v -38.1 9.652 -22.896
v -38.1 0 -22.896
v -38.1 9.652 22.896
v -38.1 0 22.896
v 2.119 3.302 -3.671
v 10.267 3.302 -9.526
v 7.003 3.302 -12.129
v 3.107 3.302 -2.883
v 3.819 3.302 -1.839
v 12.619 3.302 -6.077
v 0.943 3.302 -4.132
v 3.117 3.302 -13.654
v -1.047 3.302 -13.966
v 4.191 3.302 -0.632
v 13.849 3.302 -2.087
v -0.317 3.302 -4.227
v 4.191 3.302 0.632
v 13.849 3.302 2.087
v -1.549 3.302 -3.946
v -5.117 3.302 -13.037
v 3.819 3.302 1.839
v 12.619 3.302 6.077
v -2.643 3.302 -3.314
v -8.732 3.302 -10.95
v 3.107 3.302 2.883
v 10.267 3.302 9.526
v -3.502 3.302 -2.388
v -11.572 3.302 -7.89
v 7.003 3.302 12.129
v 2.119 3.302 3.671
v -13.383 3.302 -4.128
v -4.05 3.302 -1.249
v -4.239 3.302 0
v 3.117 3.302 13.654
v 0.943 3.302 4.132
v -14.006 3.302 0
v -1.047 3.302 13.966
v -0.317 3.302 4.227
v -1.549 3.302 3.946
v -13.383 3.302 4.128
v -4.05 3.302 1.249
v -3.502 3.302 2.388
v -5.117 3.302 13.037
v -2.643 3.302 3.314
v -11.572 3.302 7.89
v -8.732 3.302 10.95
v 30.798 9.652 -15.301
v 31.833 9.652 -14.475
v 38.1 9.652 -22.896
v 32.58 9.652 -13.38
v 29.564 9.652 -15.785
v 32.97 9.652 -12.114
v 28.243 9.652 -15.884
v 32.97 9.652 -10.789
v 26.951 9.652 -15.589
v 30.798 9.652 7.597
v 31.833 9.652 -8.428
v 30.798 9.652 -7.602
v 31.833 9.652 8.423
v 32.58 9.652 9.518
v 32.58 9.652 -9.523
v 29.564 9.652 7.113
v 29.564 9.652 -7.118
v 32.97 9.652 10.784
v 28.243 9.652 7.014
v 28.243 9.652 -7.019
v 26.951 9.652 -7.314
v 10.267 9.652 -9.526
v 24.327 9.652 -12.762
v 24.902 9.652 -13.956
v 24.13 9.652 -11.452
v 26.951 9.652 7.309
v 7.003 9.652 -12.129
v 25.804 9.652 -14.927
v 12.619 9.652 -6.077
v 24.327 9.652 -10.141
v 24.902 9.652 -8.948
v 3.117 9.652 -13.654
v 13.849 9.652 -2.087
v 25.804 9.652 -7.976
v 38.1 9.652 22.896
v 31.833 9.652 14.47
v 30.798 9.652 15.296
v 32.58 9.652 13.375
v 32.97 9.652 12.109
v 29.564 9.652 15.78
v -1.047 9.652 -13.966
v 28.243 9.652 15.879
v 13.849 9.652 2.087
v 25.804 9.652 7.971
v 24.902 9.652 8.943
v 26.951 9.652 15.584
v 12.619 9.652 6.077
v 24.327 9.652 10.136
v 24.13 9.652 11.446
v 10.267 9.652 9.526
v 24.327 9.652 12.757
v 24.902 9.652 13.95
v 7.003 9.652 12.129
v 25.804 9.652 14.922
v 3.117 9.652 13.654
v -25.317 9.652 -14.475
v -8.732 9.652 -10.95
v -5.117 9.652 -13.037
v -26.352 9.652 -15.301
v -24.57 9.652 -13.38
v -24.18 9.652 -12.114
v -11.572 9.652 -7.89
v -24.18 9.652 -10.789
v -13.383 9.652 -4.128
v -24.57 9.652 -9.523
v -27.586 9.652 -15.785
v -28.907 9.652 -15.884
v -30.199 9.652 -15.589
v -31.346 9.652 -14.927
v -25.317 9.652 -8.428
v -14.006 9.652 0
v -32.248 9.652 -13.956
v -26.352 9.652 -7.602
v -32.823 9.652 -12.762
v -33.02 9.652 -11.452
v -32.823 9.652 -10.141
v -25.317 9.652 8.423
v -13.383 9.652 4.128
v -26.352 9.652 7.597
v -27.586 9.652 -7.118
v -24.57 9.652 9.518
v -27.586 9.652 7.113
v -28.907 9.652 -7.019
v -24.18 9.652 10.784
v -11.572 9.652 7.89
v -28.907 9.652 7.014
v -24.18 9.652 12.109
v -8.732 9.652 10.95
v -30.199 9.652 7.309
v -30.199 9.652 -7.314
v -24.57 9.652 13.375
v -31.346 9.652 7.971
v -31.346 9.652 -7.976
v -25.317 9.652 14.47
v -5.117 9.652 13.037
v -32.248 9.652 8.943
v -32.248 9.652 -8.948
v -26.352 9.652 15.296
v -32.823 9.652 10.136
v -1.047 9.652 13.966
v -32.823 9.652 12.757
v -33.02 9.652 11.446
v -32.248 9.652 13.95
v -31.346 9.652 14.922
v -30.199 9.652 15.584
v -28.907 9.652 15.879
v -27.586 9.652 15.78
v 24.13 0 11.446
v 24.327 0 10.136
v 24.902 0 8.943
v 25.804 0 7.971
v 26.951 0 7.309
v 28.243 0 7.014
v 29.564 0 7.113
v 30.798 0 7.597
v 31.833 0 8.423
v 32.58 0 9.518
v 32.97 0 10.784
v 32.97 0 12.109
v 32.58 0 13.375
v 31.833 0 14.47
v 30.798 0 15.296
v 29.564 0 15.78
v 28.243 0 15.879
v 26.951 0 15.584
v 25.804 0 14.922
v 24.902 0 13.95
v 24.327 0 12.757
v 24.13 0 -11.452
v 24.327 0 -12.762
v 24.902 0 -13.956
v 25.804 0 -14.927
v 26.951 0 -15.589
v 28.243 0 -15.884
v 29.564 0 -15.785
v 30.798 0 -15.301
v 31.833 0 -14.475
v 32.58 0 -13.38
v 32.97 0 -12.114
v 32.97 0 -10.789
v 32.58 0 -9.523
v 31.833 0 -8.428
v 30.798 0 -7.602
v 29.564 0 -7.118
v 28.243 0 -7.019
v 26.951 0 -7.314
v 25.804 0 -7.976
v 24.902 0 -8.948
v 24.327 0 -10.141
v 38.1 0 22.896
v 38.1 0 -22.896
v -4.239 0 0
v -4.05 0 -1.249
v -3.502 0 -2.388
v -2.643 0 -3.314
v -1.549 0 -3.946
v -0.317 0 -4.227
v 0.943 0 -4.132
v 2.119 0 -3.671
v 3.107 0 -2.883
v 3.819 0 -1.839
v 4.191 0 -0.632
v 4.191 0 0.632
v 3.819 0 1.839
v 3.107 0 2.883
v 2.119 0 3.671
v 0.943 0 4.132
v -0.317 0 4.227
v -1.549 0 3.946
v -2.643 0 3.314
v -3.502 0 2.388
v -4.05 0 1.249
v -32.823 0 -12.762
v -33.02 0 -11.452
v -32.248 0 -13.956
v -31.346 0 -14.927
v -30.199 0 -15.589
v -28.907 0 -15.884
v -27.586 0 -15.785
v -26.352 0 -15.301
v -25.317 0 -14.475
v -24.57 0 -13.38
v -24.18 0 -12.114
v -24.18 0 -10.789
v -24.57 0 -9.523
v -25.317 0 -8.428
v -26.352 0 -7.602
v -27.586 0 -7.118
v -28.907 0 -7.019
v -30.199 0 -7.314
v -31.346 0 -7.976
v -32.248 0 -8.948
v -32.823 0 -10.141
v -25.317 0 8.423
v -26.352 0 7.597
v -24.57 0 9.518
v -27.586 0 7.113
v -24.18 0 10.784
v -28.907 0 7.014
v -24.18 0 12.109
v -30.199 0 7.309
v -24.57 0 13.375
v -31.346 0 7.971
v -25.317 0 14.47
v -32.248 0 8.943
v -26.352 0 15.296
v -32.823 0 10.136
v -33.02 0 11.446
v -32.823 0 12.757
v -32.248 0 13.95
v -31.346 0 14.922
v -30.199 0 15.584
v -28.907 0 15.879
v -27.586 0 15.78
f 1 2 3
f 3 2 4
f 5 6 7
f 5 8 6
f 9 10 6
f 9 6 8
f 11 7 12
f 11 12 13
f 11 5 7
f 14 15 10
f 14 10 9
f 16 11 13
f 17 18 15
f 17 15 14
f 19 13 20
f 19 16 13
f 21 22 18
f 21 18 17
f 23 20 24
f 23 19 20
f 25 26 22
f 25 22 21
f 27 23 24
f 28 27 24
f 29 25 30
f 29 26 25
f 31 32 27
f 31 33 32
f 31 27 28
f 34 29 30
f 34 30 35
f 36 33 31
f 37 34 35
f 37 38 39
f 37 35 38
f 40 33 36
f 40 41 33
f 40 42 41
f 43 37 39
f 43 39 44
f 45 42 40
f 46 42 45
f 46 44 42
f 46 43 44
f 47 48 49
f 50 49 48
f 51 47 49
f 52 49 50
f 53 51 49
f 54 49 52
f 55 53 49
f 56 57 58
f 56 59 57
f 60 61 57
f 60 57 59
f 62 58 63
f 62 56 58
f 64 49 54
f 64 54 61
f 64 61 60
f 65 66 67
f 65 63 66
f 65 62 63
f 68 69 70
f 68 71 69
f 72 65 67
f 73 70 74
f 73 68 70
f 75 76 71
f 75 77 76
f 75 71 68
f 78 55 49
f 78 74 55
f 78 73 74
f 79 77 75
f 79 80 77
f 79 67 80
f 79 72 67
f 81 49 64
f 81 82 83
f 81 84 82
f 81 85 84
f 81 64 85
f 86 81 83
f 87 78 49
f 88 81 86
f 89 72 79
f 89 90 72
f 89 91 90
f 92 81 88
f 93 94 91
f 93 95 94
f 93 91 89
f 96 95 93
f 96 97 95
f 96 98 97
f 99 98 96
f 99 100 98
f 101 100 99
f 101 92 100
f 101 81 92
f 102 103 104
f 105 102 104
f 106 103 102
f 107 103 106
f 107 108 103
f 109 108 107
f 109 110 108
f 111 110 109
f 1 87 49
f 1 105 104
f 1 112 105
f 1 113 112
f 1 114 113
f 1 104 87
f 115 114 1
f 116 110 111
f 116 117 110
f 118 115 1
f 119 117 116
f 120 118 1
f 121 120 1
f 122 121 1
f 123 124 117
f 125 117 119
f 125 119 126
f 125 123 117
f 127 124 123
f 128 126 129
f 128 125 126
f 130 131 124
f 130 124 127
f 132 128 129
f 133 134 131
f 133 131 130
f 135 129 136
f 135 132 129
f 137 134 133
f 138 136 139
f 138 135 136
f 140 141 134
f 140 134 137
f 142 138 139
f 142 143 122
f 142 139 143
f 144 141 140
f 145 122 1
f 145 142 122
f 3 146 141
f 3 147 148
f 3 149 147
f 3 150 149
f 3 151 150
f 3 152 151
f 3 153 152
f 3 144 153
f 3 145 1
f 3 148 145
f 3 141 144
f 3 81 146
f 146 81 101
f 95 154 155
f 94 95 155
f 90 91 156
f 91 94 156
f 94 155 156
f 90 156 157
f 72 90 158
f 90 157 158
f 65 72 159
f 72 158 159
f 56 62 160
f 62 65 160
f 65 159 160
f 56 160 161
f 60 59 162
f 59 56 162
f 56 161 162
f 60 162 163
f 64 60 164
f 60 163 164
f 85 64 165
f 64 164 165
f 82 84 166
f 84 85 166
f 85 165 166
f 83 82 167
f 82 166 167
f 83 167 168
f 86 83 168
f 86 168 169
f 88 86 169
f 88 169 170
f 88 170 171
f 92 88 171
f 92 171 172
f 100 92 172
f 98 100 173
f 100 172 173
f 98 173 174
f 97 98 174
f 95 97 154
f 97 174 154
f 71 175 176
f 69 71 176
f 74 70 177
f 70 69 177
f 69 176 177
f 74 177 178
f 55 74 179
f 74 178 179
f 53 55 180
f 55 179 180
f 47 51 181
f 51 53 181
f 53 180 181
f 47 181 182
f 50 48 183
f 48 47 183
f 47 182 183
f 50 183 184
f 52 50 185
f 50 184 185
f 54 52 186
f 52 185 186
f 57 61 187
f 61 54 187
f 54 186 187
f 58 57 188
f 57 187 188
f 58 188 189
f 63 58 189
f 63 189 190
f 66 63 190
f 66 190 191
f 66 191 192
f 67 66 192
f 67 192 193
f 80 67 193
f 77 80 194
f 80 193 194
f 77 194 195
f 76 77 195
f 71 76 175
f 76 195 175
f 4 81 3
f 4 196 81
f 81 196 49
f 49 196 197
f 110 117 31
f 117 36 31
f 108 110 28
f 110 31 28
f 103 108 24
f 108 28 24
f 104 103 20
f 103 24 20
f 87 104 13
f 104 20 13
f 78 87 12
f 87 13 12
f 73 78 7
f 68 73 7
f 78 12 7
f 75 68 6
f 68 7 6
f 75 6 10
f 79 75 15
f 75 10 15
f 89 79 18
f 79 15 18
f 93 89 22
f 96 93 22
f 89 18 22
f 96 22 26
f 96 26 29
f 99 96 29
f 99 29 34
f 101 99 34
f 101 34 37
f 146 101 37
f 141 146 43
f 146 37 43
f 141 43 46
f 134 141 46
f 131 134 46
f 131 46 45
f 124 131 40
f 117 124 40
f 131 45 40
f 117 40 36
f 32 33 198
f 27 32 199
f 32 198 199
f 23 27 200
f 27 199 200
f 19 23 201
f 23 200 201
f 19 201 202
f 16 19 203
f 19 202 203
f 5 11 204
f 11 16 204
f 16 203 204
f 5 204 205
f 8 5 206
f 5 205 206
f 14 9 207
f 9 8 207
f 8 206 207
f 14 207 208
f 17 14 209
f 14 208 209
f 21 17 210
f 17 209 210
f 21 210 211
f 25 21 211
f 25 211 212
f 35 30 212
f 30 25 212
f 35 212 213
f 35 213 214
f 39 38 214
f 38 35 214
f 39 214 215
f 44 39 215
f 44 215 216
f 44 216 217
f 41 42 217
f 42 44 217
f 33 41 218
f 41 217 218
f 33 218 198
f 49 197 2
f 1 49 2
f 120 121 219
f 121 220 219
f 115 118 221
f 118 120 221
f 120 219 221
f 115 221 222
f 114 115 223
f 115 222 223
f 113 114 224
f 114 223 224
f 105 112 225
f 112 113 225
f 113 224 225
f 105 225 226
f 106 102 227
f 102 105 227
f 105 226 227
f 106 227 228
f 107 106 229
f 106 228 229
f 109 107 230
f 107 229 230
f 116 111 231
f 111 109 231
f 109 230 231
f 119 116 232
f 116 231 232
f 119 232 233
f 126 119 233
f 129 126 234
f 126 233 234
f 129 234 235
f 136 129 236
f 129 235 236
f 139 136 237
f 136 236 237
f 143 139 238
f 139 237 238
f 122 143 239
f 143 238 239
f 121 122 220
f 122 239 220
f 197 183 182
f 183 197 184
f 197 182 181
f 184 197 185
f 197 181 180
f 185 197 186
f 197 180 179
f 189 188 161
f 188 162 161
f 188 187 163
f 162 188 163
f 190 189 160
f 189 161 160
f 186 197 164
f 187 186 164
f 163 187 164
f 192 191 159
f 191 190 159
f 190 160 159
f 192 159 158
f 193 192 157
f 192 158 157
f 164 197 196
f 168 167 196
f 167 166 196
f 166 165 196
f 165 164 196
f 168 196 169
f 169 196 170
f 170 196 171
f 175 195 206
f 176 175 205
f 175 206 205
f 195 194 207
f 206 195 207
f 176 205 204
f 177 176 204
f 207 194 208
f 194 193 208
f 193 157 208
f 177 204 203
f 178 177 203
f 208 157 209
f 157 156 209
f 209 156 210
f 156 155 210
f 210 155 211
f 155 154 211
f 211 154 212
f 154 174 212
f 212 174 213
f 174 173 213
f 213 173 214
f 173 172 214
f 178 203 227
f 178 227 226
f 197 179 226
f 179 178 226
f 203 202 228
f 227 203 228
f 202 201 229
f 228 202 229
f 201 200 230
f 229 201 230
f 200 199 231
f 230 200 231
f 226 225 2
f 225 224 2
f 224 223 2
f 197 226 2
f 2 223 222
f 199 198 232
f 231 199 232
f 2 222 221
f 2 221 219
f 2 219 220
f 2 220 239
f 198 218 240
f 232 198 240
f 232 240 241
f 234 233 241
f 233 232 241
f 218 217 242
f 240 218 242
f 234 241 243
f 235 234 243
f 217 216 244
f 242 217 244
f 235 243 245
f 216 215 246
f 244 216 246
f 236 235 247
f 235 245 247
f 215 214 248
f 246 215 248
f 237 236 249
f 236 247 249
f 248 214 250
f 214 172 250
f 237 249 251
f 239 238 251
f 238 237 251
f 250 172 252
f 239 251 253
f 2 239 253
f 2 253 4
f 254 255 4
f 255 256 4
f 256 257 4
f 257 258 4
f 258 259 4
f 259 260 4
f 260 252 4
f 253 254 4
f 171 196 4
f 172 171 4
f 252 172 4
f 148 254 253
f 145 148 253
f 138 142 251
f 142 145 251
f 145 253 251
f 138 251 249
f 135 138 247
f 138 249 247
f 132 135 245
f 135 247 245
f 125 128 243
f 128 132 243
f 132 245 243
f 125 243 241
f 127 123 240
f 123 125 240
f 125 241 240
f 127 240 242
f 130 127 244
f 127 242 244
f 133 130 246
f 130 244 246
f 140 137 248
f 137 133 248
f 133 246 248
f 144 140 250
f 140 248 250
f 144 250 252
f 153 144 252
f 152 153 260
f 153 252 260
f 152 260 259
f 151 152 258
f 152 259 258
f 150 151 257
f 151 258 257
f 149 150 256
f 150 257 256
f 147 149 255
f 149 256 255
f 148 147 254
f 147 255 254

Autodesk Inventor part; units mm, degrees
ref_plane "YZ Plane" through (0, 0, 0) normal (1, 0, 0) x (0, 1, 0)
ref_plane "XZ Plane" through (0, 0, 0) normal (0, 1, 0) x (-1, 0, 0)
ref_plane "XY Plane" through (0, 0, 0) normal (0, 0, 1) x (1, 0, 0)
sketch "Sketch1" plane through (0, 0, 0) normal (0, 1, 0) x (-1, 0, 0)
  circle A0 centre (0, 0) radius 4.2386
  circle A1 centre (0, 0) radius 14.0056
  line L0 (0, 0) -> (0, 22.8956)
  line L1 (0, 0) -> (0, -22.8956)
  line L2 (0, 22.8956) -> (38.1, 22.8956)
  line L3 (0, -22.8956) -> (-38.1, -22.8956)
  line L4 (38.1, 22.8956) -> (-38.1, 22.8956)
  line L5 (-38.1, 22.8956) -> (-38.1, -22.8956)
  line L6 (-38.1, -22.8956) -> (38.1, -22.8956)
  line L7 (38.1, -22.8956) -> (38.1, 22.8956)
  line L8 (19.05, 22.8956) -> (38.1, 22.8956)
  line L9 (38.1, 22.8956) -> (19.05, 22.8956)
  line L10 (19.05, -22.8956) -> (38.1, -22.8956)
  line L11 (38.1, -22.8956) -> (38.1, 22.8956)
  line L12 (38.1, 22.8956) -> (19.05, 22.8956)
  line L13 (19.05, 22.8956) -> (19.05, -22.8956)
  line L14 (38.1, 22.8956) -> (28.575, 22.8956)
  circle A2 centre (28.575, 11.4465) radius 4.445
  circle A3 centre (28.575, -11.4516) radius 4.445
  line L15 (-19.05, -22.8956) -> (-19.05, 22.8956)
  line L16 (-38.1, 22.8956) -> (-19.05, 22.8956)
  line L17 (-19.05, 22.8956) -> (-38.1, 22.8956)
  line L18 (-38.1, -22.8956) -> (-19.05, -22.8956)
  line L19 (-19.05, -22.8956) -> (-19.05, 22.8956)
  line L20 (-19.05, 22.8956) -> (-38.1, 22.8956)
  line L21 (-38.1, 22.8956) -> (-38.1, -22.8956)
  line L22 (-19.05, 22.8956) -> (-28.575, 22.8956)
  circle A4 centre (-28.575, 11.4465) radius 4.445
  circle A5 centre (-28.575, -11.4516) radius 4.445
  dimension "d0" = 8.4772
  dimension "d1" = 28.0111
  dimension "d11" = 22.8956
  dimension "d12" = 22.8956
  dimension "d13" = 38.1
  dimension "d14" = 38.1
  dimension "d15" = 45.7911
  dimension "d16" = 76.2
  dimension "d27" = 45.7911
  dimension "d28" = 19.05
  dimension "d29" = 19.05
  dimension "d30" = 9.525
  dimension "d31" = 8.89
  dimension "d32" = 45.7911
  dimension "d33" = 45.7911
  dimension "d34" = 19.05
  dimension "d35" = 19.05
  dimension "d36" = 9.525
  dimension "d37" = 8.89
sketch "Sketch2" plane through (0, 0, 0) normal (0, 1, 0) x (-1, 0, 0)
  circle A0 centre (0, 0) radius 4.2386
  circle A1 centre (0, 0) radius 14.0056
  line L0 (0, 0) -> (0, 22.8956)
  line L1 (0, 0) -> (0, -22.8956)
  line L2 (0, 22.8956) -> (38.1, 22.8956)
  line L3 (0, -22.8956) -> (-38.1, -22.8956)
  line L4 (38.1, 22.8956) -> (-38.1, 22.8956)
  line L5 (-38.1, 22.8956) -> (-38.1, -22.8956)
  line L6 (-38.1, -22.8956) -> (38.1, -22.8956)
  line L7 (38.1, -22.8956) -> (38.1, 22.8956)
  dimension "d17" = 8.4772
  dimension "d18" = 28.0111
  dimension "d19" = 22.8956
  dimension "d20" = 22.8956
  dimension "d21" = 38.1
  dimension "d22" = 38.1
  dimension "d23" = 45.7911
  dimension "d24" = 76.2
extrude "Extrusion2" add sketch "Sketch2" along normal blind 3.302 contours A0 L0 A1 L1 | A0 L1 A1 L0
extrude "Extrusion3" add sketch "Sketch1" along normal blind 9.652 contours L0 L2 L13 L6 L1 A1 | A1 L1 L3 L15 L4 L0 | L2 L7 L6 L13 | L15 L3 L5 L4
properties part number "bracket for drone"
